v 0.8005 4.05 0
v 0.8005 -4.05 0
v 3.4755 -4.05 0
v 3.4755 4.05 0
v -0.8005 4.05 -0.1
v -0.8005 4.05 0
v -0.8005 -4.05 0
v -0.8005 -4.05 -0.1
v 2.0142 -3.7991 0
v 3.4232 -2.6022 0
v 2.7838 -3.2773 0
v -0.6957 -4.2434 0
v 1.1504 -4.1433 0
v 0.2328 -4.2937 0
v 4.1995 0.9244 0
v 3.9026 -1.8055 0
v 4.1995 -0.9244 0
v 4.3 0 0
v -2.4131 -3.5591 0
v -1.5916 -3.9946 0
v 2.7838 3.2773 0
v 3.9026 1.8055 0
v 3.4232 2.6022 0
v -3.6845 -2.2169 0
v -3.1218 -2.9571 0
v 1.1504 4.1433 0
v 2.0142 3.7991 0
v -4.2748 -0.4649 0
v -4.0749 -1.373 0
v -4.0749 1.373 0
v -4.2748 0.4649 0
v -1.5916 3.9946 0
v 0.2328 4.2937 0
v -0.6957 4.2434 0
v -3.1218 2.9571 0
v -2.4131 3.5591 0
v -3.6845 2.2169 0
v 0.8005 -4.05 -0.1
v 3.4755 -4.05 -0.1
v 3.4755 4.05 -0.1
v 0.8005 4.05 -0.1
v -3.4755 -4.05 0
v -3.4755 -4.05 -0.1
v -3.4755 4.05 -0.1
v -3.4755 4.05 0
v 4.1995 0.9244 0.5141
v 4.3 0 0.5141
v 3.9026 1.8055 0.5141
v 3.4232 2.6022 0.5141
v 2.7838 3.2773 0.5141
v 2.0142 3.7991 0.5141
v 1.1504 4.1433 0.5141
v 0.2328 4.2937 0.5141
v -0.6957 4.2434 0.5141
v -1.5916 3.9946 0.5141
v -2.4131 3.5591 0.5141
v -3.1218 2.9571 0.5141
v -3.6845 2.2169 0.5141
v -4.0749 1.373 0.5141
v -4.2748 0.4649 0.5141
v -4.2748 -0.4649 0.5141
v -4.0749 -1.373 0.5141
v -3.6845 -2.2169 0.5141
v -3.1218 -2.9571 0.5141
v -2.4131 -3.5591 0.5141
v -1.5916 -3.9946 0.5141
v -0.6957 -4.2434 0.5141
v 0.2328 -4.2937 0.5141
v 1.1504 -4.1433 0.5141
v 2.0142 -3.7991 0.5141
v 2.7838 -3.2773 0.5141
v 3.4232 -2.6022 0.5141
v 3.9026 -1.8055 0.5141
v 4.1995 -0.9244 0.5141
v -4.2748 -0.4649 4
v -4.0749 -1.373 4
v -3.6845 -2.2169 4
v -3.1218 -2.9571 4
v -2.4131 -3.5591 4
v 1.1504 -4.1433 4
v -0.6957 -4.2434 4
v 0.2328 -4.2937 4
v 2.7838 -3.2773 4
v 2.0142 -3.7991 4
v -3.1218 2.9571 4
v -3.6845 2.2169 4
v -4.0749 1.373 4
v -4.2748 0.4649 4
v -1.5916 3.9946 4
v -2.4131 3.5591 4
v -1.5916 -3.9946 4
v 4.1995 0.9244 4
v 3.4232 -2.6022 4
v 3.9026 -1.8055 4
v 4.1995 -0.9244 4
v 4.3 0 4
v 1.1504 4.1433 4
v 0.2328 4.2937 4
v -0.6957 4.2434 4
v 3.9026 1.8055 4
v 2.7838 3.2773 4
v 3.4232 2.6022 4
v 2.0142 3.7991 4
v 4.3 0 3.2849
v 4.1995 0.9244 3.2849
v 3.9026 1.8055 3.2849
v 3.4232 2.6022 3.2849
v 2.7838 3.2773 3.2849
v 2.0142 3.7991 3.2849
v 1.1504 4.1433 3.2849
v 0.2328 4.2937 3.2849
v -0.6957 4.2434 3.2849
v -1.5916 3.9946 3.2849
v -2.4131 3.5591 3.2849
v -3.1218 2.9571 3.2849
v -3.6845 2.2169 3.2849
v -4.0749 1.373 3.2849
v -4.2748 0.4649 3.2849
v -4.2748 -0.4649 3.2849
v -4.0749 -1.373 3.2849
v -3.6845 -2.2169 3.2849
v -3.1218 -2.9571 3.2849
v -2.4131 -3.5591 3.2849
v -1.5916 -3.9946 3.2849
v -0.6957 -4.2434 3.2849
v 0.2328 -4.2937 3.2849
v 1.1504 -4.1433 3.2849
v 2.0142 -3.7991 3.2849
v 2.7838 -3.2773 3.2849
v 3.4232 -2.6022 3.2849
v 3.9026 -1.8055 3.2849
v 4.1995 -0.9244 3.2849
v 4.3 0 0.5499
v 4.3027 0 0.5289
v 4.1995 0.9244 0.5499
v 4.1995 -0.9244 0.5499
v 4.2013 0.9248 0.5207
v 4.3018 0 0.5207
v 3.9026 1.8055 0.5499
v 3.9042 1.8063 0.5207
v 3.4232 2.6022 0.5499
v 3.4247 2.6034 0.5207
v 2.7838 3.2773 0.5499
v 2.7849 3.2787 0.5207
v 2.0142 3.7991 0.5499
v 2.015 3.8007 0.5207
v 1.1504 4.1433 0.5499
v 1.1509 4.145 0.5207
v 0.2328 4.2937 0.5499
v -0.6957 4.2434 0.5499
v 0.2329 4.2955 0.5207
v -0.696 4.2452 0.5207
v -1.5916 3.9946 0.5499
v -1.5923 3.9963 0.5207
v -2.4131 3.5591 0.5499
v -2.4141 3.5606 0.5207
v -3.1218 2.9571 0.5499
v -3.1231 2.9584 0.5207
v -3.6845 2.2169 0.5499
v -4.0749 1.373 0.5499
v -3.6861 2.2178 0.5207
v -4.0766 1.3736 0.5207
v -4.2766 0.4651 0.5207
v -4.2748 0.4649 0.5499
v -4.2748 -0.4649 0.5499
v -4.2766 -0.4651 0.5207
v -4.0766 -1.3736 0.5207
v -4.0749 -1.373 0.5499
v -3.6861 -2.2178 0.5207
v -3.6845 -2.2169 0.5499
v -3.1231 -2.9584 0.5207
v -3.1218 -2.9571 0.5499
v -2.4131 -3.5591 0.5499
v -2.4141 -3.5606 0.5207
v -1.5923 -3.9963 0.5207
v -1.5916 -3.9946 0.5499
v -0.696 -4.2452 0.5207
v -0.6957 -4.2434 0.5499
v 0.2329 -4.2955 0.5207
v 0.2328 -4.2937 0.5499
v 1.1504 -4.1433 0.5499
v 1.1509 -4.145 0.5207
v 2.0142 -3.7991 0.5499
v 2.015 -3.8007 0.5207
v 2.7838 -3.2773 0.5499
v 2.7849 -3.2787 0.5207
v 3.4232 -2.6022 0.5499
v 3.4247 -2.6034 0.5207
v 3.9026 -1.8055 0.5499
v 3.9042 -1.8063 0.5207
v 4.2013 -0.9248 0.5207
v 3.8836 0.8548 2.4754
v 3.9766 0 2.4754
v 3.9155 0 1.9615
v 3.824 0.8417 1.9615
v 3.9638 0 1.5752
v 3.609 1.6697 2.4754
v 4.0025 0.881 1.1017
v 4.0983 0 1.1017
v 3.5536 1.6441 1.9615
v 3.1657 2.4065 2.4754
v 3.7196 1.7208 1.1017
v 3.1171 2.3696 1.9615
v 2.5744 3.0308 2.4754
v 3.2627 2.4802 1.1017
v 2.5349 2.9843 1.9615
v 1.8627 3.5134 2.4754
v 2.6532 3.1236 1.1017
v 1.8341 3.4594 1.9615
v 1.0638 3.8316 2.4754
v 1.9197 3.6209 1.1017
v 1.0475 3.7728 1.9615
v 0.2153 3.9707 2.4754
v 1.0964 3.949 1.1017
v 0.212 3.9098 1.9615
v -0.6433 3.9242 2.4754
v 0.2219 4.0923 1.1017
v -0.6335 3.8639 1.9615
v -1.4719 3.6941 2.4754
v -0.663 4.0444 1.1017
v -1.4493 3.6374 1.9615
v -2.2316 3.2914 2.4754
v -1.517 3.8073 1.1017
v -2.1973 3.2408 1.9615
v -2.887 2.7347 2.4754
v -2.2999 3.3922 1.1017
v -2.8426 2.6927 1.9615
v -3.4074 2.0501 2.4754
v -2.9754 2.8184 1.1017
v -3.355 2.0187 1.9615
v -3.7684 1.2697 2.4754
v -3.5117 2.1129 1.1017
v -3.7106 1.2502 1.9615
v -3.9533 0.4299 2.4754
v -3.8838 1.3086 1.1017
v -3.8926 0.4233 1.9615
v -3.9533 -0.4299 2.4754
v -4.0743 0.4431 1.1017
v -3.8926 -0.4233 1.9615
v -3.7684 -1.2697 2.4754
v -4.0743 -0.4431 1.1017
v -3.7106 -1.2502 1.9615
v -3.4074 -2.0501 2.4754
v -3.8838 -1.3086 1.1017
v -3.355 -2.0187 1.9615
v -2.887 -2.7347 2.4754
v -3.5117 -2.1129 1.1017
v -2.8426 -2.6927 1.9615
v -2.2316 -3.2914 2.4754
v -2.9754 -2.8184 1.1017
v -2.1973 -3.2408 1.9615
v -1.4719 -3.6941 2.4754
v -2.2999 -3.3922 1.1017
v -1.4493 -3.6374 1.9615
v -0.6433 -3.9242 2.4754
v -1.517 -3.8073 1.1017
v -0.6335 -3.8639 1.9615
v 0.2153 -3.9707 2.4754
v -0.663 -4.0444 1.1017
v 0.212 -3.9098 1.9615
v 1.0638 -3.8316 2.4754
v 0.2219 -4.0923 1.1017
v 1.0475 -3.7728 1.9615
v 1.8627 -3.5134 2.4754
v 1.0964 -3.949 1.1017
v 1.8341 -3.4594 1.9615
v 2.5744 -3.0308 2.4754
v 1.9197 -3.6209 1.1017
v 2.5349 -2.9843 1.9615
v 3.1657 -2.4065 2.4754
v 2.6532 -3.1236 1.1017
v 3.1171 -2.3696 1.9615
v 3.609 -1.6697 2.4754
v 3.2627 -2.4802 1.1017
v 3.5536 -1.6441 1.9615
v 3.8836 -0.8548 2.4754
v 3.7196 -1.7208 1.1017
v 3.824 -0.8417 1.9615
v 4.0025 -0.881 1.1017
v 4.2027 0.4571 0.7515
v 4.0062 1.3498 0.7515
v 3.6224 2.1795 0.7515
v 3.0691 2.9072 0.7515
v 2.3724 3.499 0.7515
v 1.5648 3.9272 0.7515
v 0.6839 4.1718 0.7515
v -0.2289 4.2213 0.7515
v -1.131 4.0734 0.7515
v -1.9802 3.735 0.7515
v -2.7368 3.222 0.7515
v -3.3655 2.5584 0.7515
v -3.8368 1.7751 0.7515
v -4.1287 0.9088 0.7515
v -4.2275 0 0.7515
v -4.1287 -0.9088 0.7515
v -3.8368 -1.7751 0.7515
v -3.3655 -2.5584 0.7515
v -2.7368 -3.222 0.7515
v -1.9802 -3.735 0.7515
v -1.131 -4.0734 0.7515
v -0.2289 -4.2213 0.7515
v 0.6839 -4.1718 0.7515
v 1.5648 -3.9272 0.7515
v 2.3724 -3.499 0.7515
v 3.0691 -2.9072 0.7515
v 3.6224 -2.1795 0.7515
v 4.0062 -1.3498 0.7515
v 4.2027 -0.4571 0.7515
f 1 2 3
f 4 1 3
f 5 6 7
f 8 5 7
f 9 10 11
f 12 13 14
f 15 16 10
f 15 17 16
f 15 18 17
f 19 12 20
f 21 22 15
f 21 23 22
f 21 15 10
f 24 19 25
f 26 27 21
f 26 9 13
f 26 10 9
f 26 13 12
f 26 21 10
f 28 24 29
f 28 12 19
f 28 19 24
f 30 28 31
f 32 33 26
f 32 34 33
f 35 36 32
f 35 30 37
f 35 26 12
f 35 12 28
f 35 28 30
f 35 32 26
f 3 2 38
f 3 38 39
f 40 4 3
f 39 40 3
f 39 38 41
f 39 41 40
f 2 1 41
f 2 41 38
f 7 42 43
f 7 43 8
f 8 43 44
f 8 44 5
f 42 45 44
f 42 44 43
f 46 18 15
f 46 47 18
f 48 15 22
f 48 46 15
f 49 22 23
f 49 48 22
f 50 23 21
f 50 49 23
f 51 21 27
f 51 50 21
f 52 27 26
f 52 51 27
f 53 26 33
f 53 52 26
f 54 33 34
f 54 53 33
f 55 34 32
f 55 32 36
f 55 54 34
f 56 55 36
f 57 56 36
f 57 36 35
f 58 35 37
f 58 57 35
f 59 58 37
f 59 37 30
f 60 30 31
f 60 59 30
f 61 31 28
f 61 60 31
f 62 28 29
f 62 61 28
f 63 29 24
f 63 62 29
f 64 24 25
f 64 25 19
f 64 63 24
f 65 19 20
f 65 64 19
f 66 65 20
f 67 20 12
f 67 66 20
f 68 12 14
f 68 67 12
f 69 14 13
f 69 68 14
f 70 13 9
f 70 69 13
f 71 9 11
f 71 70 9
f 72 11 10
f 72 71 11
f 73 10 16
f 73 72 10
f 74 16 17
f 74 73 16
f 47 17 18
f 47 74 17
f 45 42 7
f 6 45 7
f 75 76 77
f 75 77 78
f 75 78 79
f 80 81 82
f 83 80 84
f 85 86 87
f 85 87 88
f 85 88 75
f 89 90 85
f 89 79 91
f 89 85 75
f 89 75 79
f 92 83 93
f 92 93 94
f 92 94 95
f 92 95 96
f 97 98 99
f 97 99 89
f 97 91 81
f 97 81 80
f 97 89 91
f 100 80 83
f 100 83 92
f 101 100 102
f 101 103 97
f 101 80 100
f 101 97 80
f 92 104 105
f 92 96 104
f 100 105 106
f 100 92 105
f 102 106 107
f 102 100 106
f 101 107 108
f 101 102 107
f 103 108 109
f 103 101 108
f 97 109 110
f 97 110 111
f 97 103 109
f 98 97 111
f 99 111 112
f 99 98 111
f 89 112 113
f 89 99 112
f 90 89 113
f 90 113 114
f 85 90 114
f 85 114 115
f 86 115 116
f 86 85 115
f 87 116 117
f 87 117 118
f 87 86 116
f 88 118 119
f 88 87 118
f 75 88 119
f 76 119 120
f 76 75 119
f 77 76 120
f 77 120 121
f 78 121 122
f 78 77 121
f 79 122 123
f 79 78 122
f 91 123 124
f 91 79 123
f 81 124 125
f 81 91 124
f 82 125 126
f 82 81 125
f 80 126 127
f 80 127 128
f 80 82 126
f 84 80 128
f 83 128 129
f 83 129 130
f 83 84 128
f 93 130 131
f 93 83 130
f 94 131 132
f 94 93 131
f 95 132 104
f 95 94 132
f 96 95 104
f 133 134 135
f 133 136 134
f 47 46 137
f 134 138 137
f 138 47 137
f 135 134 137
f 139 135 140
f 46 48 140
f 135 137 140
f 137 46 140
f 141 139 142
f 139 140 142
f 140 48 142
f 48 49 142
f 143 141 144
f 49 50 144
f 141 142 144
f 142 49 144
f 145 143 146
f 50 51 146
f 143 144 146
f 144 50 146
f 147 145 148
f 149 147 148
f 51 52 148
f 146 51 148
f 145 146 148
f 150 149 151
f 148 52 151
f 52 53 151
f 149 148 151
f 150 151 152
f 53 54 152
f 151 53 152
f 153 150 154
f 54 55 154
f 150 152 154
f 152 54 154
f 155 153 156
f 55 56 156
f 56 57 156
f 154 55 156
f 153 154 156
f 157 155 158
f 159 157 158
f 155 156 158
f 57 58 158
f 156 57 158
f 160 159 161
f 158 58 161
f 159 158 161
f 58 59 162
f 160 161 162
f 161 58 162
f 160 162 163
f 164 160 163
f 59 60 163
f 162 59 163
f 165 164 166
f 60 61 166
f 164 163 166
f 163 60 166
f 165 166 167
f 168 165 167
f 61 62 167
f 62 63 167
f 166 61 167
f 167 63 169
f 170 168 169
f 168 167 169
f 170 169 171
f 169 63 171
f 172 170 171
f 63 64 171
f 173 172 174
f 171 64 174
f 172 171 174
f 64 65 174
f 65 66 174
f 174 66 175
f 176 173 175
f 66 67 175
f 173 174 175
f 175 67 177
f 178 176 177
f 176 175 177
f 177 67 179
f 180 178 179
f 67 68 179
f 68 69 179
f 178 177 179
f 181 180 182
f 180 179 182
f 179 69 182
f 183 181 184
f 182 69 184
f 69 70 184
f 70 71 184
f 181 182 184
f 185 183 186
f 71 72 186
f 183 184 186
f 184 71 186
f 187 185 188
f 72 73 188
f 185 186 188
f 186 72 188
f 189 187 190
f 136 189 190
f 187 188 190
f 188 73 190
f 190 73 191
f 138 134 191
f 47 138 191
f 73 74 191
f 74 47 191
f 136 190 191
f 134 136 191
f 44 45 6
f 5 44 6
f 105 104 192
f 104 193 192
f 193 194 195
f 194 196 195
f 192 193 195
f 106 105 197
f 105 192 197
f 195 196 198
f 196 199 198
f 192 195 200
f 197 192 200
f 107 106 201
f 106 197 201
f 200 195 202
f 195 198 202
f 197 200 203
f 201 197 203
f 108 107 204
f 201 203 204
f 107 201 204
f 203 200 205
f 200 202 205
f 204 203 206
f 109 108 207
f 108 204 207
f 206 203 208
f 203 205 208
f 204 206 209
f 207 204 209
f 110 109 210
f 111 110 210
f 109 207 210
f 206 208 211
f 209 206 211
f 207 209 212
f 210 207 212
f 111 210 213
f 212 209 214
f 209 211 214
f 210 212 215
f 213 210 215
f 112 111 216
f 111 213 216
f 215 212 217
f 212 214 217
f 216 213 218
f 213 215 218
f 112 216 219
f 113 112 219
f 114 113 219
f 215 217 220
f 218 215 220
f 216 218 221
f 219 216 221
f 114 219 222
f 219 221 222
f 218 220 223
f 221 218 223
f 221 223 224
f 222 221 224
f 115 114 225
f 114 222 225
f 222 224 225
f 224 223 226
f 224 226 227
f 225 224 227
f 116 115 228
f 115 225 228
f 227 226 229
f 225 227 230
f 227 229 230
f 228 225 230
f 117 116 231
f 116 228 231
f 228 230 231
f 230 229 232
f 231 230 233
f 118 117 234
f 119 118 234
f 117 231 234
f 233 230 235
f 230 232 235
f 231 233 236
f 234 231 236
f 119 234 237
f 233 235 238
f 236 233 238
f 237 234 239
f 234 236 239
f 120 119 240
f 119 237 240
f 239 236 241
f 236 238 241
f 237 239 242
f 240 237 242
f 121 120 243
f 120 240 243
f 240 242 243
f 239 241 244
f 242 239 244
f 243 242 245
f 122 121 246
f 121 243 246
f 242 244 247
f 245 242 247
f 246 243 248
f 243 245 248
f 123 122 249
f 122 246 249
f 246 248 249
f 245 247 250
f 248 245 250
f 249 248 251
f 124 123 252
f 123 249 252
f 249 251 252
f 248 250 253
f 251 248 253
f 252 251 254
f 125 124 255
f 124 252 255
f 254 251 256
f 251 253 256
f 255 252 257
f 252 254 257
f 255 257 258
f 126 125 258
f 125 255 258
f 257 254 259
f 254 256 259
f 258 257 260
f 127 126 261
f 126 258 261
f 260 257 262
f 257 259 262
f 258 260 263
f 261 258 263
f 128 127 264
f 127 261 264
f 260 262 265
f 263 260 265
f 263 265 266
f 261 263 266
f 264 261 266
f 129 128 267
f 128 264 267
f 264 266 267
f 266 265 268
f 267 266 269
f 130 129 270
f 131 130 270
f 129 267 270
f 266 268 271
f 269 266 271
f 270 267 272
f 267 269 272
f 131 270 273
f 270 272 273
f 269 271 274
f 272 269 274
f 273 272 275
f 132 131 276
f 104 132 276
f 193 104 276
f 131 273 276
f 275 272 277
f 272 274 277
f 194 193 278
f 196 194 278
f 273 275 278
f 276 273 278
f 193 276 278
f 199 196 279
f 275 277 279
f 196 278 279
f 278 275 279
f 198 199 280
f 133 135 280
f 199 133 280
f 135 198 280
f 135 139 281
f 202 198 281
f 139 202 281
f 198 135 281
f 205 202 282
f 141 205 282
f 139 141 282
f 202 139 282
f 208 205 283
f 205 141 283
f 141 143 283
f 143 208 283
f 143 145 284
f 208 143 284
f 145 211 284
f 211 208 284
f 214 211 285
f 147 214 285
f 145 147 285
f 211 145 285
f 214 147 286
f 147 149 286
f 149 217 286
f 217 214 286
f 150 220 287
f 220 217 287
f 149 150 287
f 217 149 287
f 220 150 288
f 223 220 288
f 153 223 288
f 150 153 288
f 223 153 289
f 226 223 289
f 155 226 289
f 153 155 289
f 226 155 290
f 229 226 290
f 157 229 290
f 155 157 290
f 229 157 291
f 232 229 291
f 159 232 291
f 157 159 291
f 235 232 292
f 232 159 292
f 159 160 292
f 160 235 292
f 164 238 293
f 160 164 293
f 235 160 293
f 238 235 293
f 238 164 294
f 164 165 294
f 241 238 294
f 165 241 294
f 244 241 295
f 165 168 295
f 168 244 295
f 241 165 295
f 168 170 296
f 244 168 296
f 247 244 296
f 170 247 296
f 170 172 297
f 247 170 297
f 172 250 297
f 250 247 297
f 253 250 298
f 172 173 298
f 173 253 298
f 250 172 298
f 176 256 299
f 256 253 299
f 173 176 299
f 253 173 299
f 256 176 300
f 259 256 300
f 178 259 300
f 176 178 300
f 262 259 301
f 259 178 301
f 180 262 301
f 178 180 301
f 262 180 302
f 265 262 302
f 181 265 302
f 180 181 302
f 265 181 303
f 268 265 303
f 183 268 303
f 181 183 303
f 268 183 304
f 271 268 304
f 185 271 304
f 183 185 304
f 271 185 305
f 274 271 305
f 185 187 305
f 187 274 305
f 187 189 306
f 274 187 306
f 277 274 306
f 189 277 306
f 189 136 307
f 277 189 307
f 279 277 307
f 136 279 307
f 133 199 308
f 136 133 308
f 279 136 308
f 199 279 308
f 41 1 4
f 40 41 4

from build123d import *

# Parameters (mm, degrees)
F2_W     = 2.675
F2_H     = 8.1
F3_DEPTH = 0.1


with BuildPart() as f1:
    # F0 (on Front) → F1 (revolve)
    with BuildSketch(Plane.XZ):
        with BuildLine():
            Line((0, 4), (0, 0))
            Line((0, 0), (4.3, 0))
            Line((4.3, 0), (4.3, 0.5141369766))
            Line((4.3, 0.5141369766), (4.3, 0.549889286))
            add(Edge.make_bspline(
                [(4.3, 3.2849381678), (4.0835498067, 2.8322707938), (3.6646621842, 1.9562412686), (4.2710613366, 0.6763216306), (4.3, 0.549889286)],
                knots=[0, 0, 0, 0, 0.4787044083, 0.9264179829, 0.9264179829, 0.9264179829, 0.9264179829], degree=3))
            Line((4.3, 3.2849381678), (4.3, 4))
            Line((4.3, 4), (0, 4))
        make_face()
        with BuildLine():
            Line((4.3, 0.549889286), (4.3, 0.5141369766))
            add(Edge.make_bspline(
                [(4.3, 0.549889286), (4.3047560881, 0.529110048), (4.3023780441, 0.5216235123), (4.3, 0.5141369766)],
                knots=[0.9264179829, 0.9264179829, 0.9264179829, 0.9264179829, 1, 1, 1, 1], degree=3))
        make_face()
    revolve(axis=Axis((0, 0, 2), (0, 0, 1)))


with BuildPart() as f3:
    # F2 (on face) → F3 (new body)
    with BuildSketch(Plane(origin=(0, 0, 0), x_dir=(1, 0, 0), z_dir=(0, 0, -1))):
        with Locations((2.138, 0)):
            Rectangle(F2_W, F2_H)
    extrude(amount=F3_DEPTH)


with BuildPart() as f3b:
    # F2 (on face) → F3, piece 2 (new body)
    with BuildSketch(Plane(origin=(0, 0, 0), x_dir=(1, 0, 0), z_dir=(0, 0, -1))):
        with Locations((-2.138, 0)):
            Rectangle(F2_W, F2_H)
    extrude(amount=F3_DEPTH)


solid = Compound([f1.part, f3.part, f3b.part])
